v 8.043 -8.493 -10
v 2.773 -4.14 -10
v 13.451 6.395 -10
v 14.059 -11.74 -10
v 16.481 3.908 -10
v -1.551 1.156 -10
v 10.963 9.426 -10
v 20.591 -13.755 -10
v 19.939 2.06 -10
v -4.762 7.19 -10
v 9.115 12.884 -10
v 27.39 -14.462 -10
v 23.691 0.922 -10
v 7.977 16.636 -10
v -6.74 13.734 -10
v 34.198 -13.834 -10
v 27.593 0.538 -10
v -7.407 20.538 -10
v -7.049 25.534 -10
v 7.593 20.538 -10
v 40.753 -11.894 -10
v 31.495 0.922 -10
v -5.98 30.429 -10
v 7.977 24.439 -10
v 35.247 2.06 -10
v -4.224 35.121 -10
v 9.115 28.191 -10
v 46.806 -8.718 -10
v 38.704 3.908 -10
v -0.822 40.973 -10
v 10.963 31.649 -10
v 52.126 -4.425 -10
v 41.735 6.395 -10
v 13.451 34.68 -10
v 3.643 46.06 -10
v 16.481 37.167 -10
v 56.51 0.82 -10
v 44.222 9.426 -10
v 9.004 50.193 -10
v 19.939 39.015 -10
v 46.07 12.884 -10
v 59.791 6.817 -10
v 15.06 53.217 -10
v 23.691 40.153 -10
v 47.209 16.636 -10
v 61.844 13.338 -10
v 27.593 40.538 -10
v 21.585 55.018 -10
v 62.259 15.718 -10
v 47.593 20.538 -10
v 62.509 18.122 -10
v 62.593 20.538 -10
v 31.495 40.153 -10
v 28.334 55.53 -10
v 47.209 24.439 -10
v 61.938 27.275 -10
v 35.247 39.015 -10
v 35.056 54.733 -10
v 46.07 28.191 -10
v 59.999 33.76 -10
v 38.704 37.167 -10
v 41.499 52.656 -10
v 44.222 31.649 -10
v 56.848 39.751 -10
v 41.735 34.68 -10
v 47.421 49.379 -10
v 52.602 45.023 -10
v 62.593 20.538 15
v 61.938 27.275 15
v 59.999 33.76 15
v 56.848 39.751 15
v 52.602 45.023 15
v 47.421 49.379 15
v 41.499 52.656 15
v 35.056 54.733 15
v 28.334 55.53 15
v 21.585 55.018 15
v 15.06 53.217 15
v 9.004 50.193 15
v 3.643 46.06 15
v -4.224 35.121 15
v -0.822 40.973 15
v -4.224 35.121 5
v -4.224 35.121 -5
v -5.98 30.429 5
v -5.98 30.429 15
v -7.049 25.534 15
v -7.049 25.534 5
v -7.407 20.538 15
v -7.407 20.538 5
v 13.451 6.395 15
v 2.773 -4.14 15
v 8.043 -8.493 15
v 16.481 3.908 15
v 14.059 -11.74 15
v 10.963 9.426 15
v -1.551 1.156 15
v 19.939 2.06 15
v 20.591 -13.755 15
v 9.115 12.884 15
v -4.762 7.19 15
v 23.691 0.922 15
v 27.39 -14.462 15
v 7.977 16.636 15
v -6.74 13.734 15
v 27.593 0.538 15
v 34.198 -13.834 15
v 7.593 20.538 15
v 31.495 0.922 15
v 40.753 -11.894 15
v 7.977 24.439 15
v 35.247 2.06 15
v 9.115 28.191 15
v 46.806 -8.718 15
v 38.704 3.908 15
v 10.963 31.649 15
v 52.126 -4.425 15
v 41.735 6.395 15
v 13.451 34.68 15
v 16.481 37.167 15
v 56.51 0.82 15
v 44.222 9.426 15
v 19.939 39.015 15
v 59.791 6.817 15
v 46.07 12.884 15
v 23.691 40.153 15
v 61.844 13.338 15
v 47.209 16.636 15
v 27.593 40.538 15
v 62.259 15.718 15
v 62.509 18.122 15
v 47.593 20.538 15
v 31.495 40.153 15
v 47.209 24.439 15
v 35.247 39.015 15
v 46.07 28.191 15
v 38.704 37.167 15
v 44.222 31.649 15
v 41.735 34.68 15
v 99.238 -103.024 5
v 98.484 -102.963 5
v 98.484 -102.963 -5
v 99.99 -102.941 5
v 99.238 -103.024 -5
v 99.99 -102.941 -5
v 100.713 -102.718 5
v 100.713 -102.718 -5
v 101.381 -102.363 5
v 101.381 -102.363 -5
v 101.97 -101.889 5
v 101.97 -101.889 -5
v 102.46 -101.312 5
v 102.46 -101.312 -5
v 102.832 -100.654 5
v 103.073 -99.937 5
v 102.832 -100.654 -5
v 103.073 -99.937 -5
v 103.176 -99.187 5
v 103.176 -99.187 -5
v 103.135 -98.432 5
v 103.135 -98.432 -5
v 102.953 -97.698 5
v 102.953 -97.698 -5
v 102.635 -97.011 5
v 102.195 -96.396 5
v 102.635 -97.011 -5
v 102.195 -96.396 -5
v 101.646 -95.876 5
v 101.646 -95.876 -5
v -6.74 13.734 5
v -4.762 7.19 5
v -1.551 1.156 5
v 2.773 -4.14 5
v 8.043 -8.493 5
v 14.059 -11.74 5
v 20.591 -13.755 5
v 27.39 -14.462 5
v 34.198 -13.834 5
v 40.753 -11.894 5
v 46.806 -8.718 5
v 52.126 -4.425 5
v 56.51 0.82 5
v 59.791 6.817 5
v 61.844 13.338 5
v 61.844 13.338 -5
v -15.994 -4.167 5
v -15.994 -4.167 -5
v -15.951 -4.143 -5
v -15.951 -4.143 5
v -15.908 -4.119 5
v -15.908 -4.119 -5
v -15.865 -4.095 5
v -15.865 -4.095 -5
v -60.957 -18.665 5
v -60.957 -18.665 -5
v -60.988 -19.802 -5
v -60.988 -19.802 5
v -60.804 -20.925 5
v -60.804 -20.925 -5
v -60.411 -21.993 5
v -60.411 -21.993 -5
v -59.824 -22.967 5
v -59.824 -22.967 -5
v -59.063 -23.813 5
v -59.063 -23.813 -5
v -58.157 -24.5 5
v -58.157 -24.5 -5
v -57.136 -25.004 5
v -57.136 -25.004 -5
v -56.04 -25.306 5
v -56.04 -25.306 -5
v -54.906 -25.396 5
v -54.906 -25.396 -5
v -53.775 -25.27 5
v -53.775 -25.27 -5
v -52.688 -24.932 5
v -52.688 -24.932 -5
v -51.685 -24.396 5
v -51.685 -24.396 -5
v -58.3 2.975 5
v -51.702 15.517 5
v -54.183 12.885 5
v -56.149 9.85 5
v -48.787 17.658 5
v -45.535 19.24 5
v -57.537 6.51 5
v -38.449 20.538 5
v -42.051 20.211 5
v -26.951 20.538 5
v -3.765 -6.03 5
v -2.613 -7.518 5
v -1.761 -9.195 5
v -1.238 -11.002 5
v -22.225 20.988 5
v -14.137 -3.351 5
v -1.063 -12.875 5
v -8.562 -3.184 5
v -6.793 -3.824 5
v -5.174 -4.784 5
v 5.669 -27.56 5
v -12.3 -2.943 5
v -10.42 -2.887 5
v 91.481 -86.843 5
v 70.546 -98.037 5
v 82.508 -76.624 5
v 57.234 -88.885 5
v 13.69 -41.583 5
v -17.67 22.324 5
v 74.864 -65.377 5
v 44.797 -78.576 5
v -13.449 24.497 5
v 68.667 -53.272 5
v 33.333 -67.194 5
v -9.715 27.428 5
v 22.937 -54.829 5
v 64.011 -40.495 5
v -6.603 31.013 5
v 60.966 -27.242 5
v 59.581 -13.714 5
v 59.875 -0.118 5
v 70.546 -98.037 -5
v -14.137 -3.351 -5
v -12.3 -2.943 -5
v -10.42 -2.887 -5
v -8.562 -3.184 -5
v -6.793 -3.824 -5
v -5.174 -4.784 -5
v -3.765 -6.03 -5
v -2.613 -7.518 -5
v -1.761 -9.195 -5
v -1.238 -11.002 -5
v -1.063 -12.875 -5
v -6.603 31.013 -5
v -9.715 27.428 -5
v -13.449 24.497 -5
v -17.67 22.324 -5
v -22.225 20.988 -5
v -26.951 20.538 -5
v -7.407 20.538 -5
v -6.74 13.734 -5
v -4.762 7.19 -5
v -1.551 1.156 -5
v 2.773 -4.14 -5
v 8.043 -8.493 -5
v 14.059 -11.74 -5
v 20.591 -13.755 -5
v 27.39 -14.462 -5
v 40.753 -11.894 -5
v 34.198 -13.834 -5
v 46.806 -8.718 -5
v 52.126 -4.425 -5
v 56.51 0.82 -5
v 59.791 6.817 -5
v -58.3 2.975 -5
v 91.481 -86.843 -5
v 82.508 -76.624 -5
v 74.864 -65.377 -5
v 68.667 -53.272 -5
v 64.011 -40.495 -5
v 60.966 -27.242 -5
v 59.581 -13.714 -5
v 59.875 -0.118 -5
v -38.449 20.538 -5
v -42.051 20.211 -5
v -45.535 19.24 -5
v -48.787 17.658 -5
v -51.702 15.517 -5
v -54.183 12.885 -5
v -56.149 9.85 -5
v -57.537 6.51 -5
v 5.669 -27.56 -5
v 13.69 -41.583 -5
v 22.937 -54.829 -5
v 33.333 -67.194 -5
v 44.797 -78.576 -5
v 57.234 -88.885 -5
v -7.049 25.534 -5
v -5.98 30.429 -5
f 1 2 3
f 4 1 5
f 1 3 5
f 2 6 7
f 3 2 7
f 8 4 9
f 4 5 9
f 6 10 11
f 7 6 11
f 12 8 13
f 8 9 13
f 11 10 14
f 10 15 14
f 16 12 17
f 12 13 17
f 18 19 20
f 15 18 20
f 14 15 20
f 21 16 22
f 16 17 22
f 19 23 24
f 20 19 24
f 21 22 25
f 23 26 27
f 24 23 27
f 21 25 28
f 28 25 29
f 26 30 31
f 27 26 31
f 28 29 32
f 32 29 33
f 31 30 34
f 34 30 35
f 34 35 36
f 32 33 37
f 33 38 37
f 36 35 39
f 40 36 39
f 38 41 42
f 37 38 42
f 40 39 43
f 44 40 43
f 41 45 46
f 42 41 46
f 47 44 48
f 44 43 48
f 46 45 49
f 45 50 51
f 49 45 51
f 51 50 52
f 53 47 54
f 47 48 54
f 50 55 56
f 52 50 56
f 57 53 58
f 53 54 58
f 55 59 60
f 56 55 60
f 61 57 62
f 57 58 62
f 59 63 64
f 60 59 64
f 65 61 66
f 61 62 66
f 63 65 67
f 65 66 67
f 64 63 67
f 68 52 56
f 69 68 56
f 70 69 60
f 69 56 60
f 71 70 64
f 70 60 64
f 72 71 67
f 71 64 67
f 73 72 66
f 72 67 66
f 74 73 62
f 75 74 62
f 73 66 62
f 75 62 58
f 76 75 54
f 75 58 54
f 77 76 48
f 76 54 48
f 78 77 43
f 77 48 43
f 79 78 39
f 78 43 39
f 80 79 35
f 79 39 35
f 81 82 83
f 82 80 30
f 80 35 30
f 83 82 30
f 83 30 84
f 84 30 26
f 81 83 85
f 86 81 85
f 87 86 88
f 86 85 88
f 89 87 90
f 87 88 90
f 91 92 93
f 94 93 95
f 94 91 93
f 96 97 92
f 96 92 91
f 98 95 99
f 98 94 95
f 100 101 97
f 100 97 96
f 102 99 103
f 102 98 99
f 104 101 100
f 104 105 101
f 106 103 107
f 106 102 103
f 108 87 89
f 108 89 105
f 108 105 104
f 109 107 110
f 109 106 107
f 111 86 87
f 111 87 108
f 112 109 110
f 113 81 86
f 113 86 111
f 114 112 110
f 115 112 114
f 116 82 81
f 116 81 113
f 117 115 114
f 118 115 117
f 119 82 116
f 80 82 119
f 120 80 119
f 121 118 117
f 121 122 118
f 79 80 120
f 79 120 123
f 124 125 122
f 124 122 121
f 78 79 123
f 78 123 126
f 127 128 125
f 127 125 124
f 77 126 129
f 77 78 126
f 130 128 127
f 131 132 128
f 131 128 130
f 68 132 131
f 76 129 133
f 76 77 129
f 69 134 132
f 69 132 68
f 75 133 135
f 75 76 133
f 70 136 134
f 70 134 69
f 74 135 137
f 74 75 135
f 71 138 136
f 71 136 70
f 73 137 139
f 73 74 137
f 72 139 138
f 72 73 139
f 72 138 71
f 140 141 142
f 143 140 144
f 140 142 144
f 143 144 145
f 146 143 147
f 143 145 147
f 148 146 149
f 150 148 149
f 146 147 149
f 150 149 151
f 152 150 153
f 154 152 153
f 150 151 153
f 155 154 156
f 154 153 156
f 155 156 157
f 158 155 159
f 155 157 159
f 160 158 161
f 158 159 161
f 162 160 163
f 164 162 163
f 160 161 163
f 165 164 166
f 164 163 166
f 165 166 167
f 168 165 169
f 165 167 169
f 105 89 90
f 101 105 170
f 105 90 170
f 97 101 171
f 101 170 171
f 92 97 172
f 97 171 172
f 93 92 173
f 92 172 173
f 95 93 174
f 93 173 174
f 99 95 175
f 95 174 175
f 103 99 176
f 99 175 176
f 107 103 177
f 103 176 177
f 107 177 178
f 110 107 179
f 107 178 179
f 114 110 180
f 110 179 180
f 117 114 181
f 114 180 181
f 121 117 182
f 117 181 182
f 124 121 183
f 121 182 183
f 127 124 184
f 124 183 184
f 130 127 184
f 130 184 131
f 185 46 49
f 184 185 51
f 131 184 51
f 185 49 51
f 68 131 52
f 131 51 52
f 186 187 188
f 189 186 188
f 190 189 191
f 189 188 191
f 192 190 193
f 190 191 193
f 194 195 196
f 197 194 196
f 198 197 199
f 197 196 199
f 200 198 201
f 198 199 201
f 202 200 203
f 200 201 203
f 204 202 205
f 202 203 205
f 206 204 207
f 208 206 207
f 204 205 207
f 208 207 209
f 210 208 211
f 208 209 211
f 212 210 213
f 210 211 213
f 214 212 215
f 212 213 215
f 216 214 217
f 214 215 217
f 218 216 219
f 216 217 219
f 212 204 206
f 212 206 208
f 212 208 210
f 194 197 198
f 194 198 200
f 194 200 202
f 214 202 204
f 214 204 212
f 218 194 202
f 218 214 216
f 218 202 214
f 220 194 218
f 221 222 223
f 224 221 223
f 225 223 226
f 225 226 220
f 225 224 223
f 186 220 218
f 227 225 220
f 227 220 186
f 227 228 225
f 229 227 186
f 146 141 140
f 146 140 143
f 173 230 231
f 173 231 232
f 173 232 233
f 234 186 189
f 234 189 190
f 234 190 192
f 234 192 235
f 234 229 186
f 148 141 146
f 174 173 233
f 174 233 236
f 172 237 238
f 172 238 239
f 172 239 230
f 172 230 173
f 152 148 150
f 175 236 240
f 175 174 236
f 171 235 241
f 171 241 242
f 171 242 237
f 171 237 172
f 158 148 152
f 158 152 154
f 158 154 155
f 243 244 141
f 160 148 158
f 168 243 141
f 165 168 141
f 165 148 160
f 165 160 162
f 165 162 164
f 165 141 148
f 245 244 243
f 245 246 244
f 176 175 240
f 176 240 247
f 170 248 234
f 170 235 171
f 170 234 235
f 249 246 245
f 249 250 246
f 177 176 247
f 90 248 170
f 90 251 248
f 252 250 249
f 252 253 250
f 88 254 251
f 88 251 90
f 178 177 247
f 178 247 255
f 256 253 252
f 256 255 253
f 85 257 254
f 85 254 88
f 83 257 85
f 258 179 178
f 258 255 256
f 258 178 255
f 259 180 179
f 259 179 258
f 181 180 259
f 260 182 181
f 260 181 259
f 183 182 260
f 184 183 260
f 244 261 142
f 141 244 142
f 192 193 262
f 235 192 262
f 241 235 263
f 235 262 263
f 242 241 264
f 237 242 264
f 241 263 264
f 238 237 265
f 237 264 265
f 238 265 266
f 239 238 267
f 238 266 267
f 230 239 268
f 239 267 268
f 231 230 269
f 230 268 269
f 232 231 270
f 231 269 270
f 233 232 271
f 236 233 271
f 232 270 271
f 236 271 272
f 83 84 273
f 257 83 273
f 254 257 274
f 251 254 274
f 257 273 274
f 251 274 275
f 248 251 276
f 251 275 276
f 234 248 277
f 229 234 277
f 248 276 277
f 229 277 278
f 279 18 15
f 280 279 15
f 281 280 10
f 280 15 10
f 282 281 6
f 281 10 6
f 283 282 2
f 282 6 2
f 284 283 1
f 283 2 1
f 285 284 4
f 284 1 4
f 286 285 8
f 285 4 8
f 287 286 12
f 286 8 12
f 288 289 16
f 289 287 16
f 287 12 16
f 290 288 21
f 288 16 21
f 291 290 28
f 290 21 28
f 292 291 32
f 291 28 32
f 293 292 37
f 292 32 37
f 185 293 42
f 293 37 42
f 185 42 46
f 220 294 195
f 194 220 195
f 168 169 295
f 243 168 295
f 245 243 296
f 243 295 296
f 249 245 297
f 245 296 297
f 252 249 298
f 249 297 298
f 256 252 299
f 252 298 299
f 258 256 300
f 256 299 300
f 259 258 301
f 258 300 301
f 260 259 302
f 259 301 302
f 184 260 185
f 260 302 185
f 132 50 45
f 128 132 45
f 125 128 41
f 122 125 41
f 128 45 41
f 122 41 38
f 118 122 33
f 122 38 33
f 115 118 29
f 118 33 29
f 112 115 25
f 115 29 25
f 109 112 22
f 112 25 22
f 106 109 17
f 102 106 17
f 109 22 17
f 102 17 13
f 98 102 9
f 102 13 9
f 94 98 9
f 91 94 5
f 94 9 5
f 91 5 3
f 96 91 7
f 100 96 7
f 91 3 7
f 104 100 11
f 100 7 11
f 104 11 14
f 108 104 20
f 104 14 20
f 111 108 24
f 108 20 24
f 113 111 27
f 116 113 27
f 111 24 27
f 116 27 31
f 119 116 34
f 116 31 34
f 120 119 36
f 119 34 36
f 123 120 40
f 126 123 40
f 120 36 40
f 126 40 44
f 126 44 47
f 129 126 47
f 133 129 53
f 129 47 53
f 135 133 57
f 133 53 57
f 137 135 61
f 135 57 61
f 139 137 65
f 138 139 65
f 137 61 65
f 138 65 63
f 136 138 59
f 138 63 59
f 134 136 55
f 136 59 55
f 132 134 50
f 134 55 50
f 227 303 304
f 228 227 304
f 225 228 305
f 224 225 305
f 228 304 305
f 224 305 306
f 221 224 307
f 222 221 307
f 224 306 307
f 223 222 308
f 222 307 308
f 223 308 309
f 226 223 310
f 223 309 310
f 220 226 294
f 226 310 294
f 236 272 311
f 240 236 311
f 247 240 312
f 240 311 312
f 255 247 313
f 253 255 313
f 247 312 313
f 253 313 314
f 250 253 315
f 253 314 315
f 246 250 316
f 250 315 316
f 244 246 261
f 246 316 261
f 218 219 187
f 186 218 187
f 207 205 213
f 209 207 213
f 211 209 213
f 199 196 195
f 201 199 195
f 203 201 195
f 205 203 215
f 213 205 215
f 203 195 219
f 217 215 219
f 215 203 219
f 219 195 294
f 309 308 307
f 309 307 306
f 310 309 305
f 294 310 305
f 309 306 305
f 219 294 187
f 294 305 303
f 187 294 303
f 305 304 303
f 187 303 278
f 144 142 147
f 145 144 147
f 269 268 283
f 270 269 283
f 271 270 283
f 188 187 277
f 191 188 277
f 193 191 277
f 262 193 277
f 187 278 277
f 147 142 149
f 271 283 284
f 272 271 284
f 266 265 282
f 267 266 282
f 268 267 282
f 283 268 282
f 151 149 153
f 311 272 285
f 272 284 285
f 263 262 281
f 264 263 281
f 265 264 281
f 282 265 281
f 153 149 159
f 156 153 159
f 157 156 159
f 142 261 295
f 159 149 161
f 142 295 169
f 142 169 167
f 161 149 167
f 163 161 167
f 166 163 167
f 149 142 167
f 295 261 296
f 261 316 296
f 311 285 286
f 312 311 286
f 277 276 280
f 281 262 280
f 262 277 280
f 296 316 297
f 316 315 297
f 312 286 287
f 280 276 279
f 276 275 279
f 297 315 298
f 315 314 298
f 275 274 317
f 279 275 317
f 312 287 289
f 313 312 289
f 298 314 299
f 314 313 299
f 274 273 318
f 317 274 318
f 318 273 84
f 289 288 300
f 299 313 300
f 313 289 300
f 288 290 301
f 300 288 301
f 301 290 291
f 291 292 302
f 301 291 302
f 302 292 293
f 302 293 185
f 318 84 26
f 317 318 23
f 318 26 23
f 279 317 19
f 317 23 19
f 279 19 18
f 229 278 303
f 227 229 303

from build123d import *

# Parameters (mm, degrees)
Y_KSEKLIK_EKSTR_ZYON6_DEPTH      = 15
Y_KSEKLIK_EKSTR_ZYON6_DEPTH_BACK = 10
IZIM2_R                          = 35
IZIM2_R_2                        = 20
Y_KSEKLIK_EKSTR_ZYON7_DEPTH      = 5
Y_KSEKLIK_EKSTR_ZYON7_DEPTH_BACK = 5


with BuildPart() as part:
    # Çizim2 → Yükseklik-Ekstrüzyon6 (new, two sides: drawn at the far end of the back side and taken through both)
    with BuildSketch(Plane.XY.offset(-Y_KSEKLIK_EKSTR_ZYON6_DEPTH_BACK)):
        with Locations((27.5928394, 20.537515488)):
            Circle(IZIM2_R)
        with Locations((27.5928394, 20.537515488)):
            Circle(IZIM2_R_2, mode=Mode.SUBTRACT)
    extrude(amount=Y_KSEKLIK_EKSTR_ZYON6_DEPTH + Y_KSEKLIK_EKSTR_ZYON6_DEPTH_BACK)

    # Çizim2<9> → Yükseklik-Ekstrüzyon7 (add, two sides: drawn at the far end of the back side and taken through both)
    with BuildSketch(Plane.XY.offset(-Y_KSEKLIK_EKSTR_ZYON7_DEPTH_BACK)):
        with BuildLine():
            ThreePointArc((61.844285789, 13.337625196), (16.633425799, -12.702389047), (-4.224237601, 35.120848822))
            ThreePointArc((-4.224237601, 35.120848822), (-13.449178052, 24.4968802), (-26.950721174, 20.537515488))
            Line((-26.950721174, 20.537515488), (-38.44931098, 20.537515488))
            ThreePointArc((-38.44931098, 20.537515488), (-51.701711944, 15.516629904), (-58.300234012, 2.974902357))
            Line((-58.300234012, 2.974902357), (-60.95730449, -18.665200093))
            ThreePointArc((-60.95730449, -18.665200093), (-58.156545185, -24.500240081), (-51.684983771, -24.396138183))
            Line((-51.684983771, -24.396138183), (-15.993696643, -4.166774273))
            ThreePointArc((-15.993696643, -4.166774273), (-15.929312008, -4.130595361), (-15.864661939, -4.094892934))
            ThreePointArc((-15.864661939, -4.094892934), (-5.960873253, -4.265931617), (-1.062781275, -12.875401956))
            ThreePointArc((-1.062781275, -12.875401956), (27.996215902, -61.128273793), (70.546183821, -98.037150605))
            Line((70.546183821, -98.037150605), (98.484313975, -102.963396742))
            ThreePointArc((98.484313975, -102.963396742), (102.831933538, -100.653703951), (101.646021849, -95.875619594))
            ThreePointArc((101.646021849, -95.875619594), (66.141131912, -46.955735677), (61.844285789, 13.337625196))
        make_face()
    extrude(amount=Y_KSEKLIK_EKSTR_ZYON7_DEPTH + Y_KSEKLIK_EKSTR_ZYON7_DEPTH_BACK)


solid = part.part
